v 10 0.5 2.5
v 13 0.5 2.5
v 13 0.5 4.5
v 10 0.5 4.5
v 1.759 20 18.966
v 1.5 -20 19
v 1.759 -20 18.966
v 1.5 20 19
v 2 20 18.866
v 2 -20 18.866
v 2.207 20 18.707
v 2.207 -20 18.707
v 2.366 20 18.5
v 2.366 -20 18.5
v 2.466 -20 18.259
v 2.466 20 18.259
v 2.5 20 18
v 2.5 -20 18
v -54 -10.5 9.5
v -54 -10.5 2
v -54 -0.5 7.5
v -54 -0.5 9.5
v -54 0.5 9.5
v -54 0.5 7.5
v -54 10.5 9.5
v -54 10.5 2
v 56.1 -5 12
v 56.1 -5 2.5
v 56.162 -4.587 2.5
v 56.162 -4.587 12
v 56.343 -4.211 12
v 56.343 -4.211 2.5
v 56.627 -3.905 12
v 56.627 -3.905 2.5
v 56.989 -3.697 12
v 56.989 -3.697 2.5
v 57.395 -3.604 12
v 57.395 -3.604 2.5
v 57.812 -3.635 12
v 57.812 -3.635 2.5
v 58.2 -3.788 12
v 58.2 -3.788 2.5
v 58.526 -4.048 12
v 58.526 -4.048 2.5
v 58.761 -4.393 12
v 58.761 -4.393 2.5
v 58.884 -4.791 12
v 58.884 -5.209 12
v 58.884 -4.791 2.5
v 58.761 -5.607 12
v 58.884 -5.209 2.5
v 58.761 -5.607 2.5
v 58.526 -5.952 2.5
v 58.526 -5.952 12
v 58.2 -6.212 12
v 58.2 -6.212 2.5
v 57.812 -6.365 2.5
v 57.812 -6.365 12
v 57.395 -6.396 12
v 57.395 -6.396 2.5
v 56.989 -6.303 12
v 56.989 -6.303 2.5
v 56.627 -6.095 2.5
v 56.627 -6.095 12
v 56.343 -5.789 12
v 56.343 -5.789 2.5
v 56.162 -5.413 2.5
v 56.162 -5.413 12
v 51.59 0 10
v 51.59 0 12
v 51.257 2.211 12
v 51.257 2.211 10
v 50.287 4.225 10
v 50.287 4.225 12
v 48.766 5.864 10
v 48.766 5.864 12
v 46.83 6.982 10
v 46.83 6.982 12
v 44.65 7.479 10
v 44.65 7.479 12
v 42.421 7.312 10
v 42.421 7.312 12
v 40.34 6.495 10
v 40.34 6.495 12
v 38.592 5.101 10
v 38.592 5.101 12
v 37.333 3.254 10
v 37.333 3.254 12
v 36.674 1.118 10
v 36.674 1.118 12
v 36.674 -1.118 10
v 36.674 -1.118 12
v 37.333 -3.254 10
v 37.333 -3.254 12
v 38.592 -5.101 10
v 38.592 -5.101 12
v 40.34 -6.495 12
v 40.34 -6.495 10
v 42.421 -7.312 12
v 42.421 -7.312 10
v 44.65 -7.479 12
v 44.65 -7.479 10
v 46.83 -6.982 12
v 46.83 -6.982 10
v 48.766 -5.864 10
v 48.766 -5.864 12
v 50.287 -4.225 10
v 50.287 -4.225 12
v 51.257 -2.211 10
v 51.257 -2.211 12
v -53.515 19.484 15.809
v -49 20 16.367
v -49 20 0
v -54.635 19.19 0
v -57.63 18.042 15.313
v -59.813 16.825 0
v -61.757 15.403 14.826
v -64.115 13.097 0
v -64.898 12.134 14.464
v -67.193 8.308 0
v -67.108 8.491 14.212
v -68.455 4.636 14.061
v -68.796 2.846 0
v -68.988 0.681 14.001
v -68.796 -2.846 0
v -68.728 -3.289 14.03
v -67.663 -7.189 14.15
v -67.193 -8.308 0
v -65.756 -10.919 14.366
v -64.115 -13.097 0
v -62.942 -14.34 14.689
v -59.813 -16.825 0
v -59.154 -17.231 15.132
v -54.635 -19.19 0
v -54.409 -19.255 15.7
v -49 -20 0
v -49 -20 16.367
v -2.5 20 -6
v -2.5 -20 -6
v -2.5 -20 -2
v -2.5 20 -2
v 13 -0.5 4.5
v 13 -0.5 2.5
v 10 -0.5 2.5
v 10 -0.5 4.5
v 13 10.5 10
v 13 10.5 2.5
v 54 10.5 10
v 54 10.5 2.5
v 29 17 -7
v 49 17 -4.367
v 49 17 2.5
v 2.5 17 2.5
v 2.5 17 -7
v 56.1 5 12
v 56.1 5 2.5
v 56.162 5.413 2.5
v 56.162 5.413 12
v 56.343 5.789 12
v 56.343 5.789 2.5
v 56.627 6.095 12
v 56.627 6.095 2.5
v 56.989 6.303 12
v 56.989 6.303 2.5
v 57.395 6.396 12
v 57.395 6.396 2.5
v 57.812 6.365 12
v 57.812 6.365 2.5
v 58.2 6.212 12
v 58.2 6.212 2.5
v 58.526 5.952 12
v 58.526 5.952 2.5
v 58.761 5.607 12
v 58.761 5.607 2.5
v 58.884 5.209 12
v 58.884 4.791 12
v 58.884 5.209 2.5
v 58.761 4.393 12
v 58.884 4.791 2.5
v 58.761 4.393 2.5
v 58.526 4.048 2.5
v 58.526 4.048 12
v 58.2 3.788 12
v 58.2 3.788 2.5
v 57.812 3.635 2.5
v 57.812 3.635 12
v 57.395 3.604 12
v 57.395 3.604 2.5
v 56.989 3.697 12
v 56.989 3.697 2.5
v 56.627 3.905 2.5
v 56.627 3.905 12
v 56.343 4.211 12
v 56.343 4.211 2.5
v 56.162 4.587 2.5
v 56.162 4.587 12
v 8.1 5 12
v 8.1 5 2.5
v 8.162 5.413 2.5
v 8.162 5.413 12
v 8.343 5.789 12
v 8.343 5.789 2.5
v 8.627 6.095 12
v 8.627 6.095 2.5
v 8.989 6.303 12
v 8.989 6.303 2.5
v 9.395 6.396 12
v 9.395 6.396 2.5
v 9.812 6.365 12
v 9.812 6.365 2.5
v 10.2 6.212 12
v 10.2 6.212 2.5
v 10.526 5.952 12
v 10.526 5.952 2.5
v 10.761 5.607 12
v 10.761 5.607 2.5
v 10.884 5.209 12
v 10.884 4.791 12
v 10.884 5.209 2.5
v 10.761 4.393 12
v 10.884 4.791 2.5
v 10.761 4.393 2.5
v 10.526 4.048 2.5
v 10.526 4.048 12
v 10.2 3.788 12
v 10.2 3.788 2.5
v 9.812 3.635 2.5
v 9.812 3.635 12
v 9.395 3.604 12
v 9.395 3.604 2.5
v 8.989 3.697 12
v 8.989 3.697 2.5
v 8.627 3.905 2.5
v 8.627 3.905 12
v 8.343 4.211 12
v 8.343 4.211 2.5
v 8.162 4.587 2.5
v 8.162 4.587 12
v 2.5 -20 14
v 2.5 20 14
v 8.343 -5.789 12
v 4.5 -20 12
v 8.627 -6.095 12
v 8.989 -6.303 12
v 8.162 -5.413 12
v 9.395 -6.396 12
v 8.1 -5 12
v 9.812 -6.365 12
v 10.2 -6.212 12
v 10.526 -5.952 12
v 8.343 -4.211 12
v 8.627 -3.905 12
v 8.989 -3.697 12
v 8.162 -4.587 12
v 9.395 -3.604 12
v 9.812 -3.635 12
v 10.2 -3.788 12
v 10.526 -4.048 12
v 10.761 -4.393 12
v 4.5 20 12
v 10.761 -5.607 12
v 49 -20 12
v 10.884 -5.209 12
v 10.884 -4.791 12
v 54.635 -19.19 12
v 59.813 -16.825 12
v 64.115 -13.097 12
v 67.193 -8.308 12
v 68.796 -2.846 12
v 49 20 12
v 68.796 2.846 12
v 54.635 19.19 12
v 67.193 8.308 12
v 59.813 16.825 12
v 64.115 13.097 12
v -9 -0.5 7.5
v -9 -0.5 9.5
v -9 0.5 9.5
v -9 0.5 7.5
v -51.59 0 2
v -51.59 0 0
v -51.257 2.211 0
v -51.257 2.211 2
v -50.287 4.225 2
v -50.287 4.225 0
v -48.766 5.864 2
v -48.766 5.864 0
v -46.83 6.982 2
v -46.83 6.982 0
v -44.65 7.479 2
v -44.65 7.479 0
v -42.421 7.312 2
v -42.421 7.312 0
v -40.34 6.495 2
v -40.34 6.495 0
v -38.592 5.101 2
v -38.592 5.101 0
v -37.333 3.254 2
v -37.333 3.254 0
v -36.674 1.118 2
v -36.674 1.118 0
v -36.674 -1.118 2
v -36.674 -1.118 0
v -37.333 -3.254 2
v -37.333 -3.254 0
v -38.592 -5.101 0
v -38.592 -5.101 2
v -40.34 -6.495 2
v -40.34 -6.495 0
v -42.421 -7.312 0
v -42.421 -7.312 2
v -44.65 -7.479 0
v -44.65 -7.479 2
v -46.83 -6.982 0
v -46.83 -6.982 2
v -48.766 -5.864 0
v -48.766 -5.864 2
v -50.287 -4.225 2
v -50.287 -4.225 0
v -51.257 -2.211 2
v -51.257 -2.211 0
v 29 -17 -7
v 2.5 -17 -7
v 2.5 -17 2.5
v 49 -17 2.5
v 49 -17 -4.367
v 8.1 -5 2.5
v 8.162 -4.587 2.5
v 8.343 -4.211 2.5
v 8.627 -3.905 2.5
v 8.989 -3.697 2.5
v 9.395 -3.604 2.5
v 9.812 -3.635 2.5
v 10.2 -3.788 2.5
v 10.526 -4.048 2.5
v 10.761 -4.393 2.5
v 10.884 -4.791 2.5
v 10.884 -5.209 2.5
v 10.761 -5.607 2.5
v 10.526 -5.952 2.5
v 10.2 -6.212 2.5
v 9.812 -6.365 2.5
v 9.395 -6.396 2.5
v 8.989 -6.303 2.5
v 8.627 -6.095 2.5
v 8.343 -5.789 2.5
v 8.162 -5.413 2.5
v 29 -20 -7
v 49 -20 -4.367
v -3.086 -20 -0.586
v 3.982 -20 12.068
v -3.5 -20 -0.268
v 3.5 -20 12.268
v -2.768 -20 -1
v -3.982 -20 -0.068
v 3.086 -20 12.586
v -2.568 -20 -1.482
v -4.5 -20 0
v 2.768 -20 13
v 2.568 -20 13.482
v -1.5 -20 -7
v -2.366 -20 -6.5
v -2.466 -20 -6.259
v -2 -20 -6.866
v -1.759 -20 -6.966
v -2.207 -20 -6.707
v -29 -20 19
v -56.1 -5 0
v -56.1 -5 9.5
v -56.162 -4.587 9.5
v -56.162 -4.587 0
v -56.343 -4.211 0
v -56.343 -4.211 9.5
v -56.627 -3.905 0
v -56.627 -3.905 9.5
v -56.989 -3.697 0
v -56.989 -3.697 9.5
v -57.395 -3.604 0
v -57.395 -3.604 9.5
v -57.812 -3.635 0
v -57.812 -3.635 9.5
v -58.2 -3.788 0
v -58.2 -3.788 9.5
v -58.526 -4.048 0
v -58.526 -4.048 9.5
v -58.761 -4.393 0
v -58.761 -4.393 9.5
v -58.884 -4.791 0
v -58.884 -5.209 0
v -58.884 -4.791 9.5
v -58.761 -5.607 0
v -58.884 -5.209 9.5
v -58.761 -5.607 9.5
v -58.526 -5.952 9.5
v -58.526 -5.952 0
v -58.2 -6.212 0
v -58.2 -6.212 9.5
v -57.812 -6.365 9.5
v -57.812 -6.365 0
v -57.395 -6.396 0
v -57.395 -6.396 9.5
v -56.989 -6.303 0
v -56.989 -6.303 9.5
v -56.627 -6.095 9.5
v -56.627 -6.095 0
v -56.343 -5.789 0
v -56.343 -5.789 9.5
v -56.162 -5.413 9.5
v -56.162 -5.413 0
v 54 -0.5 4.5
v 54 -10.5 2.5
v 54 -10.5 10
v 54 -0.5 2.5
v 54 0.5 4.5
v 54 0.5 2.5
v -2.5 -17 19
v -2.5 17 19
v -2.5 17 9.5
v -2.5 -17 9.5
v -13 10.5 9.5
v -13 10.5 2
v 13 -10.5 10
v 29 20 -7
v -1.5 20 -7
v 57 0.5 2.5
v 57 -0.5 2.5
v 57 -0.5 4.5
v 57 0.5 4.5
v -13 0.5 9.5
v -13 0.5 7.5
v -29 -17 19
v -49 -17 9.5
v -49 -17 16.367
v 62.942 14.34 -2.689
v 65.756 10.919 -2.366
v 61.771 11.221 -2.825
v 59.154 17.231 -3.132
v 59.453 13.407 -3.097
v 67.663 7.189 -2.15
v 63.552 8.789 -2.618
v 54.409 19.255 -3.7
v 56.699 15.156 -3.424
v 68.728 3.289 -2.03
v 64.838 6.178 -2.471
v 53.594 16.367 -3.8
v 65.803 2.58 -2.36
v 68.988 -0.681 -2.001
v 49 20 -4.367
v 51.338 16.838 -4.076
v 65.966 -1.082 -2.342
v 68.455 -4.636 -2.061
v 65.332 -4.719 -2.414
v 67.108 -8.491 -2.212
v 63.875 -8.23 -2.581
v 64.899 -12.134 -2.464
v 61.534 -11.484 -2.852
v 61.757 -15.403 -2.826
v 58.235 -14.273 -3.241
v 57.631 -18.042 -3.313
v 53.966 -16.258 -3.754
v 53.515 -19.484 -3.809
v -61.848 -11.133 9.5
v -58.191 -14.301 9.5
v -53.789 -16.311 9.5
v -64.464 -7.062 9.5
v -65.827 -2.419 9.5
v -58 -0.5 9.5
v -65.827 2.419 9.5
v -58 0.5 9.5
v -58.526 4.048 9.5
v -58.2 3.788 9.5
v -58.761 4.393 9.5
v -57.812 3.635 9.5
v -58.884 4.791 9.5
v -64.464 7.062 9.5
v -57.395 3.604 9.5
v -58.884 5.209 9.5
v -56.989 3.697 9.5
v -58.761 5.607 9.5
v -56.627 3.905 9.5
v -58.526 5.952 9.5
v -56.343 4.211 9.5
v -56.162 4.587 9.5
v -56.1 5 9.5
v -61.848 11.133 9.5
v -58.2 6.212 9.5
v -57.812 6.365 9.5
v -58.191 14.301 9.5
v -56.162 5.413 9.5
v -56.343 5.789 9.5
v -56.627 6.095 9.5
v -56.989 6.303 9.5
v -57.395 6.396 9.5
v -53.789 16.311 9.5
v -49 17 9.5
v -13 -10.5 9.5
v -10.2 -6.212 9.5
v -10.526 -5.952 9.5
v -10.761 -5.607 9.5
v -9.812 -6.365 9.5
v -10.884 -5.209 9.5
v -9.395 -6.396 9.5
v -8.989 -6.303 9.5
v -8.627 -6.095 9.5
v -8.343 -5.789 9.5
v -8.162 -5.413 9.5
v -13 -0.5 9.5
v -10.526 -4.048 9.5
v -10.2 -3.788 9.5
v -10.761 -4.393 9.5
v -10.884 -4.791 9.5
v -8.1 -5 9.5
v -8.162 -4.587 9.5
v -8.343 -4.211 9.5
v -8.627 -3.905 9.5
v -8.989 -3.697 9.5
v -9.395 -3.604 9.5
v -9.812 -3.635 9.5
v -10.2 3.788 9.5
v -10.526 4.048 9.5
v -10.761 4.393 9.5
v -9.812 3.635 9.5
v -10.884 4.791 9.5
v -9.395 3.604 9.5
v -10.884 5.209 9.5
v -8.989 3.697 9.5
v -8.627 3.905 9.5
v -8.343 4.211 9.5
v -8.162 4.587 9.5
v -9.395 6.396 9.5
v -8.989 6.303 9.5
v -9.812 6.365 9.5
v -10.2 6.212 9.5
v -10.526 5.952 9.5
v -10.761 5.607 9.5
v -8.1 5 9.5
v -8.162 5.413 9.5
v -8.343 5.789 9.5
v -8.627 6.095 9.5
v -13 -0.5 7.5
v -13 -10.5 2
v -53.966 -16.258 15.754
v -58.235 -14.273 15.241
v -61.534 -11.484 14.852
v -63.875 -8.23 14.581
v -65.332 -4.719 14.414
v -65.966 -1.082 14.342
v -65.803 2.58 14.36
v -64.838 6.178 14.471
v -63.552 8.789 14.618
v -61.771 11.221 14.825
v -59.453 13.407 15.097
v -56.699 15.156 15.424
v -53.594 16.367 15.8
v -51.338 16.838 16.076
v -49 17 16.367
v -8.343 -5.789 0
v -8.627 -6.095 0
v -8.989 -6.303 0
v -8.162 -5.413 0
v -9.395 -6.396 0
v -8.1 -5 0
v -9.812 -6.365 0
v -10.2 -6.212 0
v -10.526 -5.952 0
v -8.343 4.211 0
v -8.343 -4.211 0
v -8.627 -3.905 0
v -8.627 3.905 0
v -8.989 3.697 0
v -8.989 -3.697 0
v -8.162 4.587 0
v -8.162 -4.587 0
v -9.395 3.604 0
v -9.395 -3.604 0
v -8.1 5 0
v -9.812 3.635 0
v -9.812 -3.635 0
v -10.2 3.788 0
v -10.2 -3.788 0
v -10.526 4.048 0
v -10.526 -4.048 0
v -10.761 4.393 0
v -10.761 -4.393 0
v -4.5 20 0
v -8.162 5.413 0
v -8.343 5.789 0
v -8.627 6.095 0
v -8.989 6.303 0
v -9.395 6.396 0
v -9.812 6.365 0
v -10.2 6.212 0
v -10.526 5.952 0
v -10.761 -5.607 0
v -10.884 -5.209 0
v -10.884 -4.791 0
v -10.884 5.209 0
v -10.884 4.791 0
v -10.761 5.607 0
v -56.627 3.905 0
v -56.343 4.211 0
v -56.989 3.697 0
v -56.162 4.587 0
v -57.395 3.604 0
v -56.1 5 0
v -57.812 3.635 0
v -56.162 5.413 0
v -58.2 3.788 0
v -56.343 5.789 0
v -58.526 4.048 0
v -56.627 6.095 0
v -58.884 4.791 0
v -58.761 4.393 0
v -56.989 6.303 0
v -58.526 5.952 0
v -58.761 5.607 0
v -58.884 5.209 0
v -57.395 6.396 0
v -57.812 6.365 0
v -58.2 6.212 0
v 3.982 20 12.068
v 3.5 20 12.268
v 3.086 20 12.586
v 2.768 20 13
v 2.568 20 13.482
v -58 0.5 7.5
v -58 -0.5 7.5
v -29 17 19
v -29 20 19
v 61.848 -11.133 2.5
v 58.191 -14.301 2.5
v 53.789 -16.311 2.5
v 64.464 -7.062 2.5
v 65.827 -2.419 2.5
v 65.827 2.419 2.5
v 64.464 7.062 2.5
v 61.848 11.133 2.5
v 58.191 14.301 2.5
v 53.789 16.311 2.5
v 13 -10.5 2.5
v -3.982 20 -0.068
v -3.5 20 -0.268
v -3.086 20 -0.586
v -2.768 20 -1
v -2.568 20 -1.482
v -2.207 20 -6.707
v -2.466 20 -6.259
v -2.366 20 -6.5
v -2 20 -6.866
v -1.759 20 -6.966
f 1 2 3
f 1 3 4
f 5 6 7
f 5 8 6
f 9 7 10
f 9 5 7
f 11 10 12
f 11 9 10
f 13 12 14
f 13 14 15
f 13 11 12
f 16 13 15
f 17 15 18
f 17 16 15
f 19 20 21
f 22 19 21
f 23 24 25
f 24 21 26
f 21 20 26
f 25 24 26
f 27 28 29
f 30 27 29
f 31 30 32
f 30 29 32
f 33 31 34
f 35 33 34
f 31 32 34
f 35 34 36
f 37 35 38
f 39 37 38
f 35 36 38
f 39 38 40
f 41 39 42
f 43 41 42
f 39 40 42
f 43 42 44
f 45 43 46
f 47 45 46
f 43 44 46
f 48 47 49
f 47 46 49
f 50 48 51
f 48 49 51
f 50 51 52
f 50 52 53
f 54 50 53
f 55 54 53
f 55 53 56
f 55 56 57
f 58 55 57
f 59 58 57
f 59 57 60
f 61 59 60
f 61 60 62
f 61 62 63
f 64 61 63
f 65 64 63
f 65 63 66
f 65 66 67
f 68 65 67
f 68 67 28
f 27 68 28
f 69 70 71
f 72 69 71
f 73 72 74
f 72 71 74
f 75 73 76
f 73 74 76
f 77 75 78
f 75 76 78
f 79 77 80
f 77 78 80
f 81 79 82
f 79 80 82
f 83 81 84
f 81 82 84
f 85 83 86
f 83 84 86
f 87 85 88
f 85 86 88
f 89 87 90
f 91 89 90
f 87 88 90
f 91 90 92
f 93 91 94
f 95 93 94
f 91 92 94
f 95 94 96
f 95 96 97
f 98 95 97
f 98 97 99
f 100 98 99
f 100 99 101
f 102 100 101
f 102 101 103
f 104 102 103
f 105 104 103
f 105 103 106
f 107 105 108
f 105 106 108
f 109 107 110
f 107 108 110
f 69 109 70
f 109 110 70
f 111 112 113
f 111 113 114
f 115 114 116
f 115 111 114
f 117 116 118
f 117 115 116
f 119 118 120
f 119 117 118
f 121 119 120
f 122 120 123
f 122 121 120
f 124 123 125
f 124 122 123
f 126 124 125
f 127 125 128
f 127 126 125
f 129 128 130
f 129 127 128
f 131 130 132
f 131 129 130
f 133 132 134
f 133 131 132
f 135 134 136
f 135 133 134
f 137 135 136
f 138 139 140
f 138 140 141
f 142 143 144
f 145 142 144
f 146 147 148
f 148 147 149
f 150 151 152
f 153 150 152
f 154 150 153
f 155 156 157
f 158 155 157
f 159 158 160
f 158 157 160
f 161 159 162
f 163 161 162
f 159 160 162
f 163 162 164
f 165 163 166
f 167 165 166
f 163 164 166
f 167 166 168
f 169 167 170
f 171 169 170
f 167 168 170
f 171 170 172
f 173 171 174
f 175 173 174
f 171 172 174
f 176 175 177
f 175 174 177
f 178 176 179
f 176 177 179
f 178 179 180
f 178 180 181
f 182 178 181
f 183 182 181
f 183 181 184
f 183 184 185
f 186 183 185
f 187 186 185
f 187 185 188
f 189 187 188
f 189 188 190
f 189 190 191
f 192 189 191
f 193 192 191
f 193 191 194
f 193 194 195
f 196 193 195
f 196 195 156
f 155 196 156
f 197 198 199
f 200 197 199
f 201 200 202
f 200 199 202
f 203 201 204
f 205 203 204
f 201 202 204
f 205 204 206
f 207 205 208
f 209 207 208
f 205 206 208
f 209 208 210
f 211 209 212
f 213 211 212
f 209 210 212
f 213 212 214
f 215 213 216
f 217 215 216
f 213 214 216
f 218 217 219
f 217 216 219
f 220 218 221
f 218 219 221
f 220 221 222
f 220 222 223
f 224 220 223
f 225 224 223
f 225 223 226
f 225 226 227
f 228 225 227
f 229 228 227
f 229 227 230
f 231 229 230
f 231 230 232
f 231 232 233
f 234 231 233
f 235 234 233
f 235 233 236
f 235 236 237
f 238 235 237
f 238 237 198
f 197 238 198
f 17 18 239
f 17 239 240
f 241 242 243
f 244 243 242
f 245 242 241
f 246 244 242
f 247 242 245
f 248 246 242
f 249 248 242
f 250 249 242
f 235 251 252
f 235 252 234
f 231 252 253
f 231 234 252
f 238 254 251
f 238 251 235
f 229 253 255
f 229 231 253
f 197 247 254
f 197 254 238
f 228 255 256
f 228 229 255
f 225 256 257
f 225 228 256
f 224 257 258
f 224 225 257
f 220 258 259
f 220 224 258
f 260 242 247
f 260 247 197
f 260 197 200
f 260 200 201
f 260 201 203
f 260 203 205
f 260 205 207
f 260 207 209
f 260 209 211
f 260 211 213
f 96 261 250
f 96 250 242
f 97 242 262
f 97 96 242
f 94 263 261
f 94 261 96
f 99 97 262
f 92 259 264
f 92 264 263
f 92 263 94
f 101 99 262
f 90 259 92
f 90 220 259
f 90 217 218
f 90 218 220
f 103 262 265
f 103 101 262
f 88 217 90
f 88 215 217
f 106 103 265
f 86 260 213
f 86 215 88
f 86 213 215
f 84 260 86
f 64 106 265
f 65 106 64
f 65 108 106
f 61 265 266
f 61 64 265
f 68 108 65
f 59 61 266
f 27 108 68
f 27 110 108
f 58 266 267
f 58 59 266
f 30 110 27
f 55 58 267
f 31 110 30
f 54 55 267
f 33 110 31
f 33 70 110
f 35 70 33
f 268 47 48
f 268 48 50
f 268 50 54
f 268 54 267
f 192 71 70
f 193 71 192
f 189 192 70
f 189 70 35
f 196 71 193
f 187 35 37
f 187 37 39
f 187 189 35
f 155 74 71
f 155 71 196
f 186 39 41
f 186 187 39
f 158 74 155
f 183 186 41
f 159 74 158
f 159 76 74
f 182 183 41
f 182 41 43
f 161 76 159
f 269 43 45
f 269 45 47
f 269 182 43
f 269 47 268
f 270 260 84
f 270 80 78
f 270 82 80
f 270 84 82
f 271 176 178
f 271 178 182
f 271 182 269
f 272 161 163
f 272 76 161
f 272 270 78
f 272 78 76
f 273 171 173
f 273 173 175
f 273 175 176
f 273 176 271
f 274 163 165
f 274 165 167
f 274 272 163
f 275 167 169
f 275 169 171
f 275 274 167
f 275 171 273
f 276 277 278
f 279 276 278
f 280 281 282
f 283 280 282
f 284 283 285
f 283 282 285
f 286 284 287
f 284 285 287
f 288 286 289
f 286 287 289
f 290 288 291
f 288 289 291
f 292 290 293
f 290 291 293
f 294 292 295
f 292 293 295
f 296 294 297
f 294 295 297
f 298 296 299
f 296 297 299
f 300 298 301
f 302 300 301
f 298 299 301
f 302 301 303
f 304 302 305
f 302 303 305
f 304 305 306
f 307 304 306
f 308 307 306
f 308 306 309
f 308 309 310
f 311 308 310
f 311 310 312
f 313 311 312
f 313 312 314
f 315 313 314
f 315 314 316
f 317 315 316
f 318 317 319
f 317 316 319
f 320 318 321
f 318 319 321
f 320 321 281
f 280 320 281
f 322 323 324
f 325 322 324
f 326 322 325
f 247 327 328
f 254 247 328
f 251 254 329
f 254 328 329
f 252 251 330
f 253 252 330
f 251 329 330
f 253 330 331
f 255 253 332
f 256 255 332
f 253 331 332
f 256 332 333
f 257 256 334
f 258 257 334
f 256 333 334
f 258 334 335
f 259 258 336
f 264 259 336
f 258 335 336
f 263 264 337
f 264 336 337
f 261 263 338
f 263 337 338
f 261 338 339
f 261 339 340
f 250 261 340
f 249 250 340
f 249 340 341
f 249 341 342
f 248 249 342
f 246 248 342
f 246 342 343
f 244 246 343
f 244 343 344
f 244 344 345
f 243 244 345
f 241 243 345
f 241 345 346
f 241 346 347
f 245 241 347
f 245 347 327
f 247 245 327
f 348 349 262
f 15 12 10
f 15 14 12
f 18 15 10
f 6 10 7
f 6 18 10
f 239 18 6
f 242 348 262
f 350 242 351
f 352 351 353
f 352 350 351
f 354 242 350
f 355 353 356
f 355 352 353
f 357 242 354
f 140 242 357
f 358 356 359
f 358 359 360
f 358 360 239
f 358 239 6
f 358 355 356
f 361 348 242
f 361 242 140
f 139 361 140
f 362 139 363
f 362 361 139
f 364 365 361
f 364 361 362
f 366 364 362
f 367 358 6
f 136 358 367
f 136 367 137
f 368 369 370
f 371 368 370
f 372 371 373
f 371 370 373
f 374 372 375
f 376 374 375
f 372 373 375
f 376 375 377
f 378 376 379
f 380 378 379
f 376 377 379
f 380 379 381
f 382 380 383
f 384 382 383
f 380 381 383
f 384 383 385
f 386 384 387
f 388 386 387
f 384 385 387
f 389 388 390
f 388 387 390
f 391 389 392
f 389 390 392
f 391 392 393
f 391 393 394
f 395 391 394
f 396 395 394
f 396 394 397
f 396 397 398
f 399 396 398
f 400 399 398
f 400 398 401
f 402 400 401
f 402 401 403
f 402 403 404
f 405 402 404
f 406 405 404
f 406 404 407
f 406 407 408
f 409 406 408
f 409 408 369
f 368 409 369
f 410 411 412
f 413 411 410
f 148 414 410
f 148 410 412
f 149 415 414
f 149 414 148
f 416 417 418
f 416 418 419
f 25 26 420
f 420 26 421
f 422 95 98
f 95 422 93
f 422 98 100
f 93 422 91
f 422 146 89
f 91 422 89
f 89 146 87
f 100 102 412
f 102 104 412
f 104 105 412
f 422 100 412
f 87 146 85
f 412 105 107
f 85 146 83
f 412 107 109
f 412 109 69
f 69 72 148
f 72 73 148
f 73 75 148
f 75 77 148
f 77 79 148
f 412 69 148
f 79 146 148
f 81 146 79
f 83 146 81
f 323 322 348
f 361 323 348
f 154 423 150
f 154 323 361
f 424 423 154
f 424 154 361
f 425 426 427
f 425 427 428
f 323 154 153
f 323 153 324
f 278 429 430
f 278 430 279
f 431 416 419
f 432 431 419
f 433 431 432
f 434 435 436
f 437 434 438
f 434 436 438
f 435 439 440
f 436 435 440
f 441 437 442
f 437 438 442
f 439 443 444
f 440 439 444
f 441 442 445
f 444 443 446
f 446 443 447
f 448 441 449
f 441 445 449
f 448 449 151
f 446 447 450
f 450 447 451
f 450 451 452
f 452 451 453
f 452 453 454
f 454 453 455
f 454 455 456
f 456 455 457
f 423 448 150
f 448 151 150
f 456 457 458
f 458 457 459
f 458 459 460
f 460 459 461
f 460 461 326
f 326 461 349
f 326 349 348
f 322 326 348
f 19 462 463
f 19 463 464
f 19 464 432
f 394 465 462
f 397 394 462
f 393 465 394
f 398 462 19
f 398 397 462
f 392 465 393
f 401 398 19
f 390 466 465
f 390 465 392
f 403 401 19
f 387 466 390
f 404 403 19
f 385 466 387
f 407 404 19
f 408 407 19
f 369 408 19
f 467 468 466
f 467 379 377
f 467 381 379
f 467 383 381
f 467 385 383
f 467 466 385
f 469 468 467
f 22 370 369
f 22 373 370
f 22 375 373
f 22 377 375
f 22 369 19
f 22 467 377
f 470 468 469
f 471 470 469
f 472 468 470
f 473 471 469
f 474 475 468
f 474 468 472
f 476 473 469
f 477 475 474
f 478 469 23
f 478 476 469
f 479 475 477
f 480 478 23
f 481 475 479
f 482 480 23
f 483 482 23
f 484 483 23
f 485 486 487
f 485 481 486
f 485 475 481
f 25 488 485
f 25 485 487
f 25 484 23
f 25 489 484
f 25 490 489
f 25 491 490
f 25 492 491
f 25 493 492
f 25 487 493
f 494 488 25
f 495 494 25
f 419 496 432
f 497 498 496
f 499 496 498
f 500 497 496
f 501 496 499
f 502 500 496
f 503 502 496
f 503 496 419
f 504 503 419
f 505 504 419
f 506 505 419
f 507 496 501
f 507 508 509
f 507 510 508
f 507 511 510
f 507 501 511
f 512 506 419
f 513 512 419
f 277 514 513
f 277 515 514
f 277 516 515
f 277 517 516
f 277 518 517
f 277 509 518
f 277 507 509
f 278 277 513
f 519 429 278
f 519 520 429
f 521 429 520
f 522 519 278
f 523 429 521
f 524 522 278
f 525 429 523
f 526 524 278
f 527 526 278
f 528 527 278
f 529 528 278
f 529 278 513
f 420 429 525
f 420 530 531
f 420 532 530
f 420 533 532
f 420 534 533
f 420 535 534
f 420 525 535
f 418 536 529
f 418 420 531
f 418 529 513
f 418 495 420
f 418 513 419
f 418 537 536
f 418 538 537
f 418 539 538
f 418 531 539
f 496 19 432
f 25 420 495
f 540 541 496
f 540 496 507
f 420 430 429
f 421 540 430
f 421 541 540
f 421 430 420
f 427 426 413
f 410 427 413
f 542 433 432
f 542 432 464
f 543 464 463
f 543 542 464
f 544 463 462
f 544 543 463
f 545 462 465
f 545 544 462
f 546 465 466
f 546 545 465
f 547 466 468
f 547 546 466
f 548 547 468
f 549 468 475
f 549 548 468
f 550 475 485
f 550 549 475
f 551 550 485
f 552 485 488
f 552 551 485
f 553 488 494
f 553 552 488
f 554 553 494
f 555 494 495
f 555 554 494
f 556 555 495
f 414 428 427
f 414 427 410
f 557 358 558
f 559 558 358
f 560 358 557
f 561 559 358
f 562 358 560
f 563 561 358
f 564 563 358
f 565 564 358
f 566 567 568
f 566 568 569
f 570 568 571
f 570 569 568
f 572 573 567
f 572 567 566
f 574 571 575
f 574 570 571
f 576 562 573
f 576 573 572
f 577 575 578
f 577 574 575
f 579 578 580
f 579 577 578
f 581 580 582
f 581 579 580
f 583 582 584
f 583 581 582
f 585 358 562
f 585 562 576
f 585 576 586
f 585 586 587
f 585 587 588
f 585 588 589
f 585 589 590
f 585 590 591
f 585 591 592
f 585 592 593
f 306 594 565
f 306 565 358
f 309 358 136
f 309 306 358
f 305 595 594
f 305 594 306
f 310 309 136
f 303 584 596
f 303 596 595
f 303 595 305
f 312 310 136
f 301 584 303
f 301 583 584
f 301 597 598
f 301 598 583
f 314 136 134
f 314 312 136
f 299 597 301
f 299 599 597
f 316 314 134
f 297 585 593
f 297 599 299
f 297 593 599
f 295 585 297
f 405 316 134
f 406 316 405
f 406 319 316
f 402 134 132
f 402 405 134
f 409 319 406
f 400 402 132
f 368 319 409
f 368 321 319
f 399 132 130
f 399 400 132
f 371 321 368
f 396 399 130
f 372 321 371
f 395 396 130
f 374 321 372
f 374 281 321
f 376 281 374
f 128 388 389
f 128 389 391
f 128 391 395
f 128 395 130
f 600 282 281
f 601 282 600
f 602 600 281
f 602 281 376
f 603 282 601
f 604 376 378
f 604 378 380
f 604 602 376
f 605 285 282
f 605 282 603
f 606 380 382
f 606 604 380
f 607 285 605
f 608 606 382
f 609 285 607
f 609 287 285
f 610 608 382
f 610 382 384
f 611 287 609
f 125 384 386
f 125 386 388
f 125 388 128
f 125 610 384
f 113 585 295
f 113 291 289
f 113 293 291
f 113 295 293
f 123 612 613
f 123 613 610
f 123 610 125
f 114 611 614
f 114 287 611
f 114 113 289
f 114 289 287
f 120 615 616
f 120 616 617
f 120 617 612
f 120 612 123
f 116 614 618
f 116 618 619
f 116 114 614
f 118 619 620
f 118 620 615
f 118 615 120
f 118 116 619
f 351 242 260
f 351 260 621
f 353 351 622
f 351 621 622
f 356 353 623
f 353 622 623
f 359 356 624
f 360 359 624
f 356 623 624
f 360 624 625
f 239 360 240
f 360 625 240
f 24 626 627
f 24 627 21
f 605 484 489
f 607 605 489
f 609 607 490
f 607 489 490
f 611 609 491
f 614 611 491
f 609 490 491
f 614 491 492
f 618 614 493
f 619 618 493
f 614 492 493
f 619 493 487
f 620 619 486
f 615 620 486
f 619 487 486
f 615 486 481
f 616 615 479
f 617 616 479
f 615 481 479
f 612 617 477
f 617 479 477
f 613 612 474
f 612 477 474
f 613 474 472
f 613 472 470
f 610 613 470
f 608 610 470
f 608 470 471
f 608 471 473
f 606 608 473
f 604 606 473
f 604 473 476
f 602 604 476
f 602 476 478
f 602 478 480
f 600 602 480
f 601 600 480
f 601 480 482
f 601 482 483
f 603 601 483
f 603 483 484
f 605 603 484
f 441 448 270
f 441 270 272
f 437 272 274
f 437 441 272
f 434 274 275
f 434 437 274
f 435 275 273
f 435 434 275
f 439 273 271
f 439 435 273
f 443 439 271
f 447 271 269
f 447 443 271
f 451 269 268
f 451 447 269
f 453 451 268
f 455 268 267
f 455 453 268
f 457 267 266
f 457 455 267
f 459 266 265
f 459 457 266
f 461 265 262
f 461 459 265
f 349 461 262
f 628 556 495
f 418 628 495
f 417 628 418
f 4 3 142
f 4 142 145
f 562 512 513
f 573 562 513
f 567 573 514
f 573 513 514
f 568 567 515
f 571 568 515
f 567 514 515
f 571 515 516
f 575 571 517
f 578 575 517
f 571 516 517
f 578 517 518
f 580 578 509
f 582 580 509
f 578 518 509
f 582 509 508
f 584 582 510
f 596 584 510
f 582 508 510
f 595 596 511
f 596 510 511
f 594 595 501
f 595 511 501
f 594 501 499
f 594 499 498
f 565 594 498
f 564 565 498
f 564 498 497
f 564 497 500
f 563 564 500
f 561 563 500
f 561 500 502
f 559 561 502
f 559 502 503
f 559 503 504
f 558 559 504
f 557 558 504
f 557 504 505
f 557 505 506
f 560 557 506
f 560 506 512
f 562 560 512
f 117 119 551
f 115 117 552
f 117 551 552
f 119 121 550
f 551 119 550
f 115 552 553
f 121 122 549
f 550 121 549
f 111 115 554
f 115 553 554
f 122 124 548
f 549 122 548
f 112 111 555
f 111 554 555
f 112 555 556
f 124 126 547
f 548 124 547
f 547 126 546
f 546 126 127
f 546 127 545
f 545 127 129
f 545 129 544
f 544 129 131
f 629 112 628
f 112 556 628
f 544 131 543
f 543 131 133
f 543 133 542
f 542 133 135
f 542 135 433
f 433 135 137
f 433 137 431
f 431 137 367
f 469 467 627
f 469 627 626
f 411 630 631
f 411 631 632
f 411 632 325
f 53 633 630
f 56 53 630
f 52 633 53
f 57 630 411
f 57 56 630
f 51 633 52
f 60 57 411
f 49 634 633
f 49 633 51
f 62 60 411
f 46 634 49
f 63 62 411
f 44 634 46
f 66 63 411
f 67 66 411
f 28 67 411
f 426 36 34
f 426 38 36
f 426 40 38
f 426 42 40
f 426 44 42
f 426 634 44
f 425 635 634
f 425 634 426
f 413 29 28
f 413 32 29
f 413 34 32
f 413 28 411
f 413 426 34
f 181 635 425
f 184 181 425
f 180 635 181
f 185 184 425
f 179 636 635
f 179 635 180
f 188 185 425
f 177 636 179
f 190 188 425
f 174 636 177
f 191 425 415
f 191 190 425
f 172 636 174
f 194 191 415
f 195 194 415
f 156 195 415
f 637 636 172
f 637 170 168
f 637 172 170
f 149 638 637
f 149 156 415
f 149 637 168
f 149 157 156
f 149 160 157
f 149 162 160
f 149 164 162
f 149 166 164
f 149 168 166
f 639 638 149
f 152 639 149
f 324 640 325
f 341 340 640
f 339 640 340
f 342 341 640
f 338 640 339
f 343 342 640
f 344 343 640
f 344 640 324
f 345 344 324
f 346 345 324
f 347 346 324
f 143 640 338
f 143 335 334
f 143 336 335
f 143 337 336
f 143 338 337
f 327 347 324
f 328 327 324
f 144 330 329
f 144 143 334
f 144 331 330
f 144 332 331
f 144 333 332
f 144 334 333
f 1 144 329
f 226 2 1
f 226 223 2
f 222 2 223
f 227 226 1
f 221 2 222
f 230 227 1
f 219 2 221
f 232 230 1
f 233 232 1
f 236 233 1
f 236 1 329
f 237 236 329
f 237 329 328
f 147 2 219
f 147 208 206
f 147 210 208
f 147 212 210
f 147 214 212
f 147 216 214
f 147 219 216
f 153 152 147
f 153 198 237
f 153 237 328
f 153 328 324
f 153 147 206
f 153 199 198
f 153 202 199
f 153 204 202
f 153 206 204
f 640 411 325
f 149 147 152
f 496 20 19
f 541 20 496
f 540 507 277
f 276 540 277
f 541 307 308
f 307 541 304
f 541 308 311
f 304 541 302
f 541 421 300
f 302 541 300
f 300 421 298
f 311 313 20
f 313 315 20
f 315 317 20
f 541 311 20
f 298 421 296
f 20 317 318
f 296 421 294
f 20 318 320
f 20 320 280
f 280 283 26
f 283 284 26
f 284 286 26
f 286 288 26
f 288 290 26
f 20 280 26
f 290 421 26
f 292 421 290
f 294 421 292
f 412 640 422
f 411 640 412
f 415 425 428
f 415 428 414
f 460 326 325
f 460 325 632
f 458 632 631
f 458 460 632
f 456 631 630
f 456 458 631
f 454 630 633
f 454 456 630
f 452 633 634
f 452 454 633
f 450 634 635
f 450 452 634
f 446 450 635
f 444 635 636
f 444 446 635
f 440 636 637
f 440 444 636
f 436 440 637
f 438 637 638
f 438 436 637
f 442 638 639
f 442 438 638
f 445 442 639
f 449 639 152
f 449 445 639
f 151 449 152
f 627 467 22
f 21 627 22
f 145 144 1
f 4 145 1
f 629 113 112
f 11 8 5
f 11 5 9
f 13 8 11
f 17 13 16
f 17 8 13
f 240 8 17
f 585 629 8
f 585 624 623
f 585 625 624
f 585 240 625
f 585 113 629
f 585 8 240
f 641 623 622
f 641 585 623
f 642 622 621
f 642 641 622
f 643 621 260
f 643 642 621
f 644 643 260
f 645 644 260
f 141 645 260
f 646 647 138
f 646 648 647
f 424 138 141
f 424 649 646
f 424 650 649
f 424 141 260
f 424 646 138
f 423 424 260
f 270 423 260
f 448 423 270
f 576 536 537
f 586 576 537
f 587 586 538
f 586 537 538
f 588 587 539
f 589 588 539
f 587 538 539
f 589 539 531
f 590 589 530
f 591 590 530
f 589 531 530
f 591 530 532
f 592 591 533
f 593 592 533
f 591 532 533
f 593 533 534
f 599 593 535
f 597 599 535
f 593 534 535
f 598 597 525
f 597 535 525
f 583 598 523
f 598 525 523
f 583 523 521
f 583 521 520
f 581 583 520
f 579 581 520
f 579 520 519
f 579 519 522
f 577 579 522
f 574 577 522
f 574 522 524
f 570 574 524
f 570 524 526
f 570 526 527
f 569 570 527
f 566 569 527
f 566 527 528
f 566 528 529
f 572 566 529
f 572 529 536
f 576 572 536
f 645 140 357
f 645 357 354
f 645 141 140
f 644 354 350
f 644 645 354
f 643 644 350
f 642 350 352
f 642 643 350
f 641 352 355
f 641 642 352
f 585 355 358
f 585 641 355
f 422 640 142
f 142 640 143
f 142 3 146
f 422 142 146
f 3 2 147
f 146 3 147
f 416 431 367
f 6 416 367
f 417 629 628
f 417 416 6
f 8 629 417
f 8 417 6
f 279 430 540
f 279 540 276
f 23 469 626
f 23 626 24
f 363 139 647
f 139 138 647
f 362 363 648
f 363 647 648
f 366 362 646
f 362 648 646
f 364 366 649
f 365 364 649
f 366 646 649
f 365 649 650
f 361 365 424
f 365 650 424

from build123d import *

# Parameters (mm, degrees)
SKETCH1_W               = 138
SKETCH1_H               = 40
SKETCH1_W_2             = 41
SKETCH1_H_2             = 21
BOSS_EXTRUDE1_DEPTH     = 12
FILLET1_RADIUS          = 20
FILLET1_LENGTH          = 12
FILLET2_RADIUS          = 20
FILLET2_LENGTH          = 12
BOSS_EXTRUDE3_START     = 7
BOSS_EXTRUDE3_DEPTH     = 7
BOSS_EXTRUDE4_START     = 7
BOSS_EXTRUDE4_DEPTH     = 7
CUT_EXTRUDE1_DEPTH      = 75.310160813
CUT_EXTRUDE1_DEPTH_BACK = 75.310160813
CUT_EXTRUDE2_DEPTH      = 2.5
SKETCH9_W               = 41
SKETCH9_H               = 21
CUT_EXTRUDE3_DEPTH      = 2.5
SKETCH10_W              = 41
SKETCH10_H              = 21
SKETCH10_R              = 7.5
BOSS_EXTRUDE5_DEPTH     = 2
SKETCH11_W              = 41
SKETCH11_H              = 21
SKETCH11_R              = 7.5
BOSS_EXTRUDE6_DEPTH     = 2
SKETCH12_W              = 4
SKETCH12_H              = 1
CUT_EXTRUDE4_DEPTH      = 2
SKETCH13_W              = 3
SKETCH13_H              = 1
CUT_EXTRUDE5_DEPTH      = 2
FILLET4_R               = 2
FILLET5_R               = 2
FILLET6_R               = 1
SKETCH14_R              = 1.4
CUT_EXTRUDE6_DEPTH      = 74.71058283
SKETCH15_R              = 1.4
CUT_EXTRUDE7_DEPTH      = 74.71058283


with BuildPart() as part:
    # Sketch1 → Boss-Extrude1 (new body)
    with BuildSketch(Plane.XY):
        Rectangle(SKETCH1_W, SKETCH1_H)
        with Locations((-33.5, 0)):
            Rectangle(SKETCH1_W_2, SKETCH1_H_2, mode=Mode.SUBTRACT)
        with Locations((33.5, 0)):
            Rectangle(SKETCH1_W_2, SKETCH1_H_2, mode=Mode.SUBTRACT)
    extrude(amount=BOSS_EXTRUDE1_DEPTH)

    # Fillet1: full round fillet: the end face becomes a half cylinder, R = half its width
    fillet1_face = Plane((-69, 0, 6), x_dir=(0, 0, 1), z_dir=(-1, 0, 0))  # on the end face: x along it, z out of the body
    fillet1_slab = fillet1_face.offset(-FILLET1_RADIUS / 2) * Box(FILLET1_LENGTH, 2 * FILLET1_RADIUS, FILLET1_RADIUS, mode=Mode.PRIVATE)  # the body's end, R deep
    fillet1_round = Plane((-49, 0, 6), x_dir=(-1, 0, 0), z_dir=(0, 0, 1)) * Cylinder(FILLET1_RADIUS, FILLET1_LENGTH, mode=Mode.PRIVATE)  # its axis R under the face
    add(fillet1_slab - fillet1_round, mode=Mode.SUBTRACT)

    # Fillet2: full round fillet: the end face becomes a half cylinder, R = half its width
    fillet2_face = Plane((69, 0, 6), x_dir=(0, 0, -1), z_dir=(1, 0, 0))  # on the end face: x along it, z out of the body
    fillet2_slab = fillet2_face.offset(-FILLET2_RADIUS / 2) * Box(FILLET2_LENGTH, 2 * FILLET2_RADIUS, FILLET2_RADIUS, mode=Mode.PRIVATE)  # the body's end, R deep
    fillet2_round = Plane((49, 0, 6), x_dir=(1, 0, 0), z_dir=(0, 0, -1)) * Cylinder(FILLET2_RADIUS, FILLET2_LENGTH, mode=Mode.PRIVATE)  # its axis R under the face
    add(fillet2_slab - fillet2_round, mode=Mode.SUBTRACT)

    # Sketch3 → Boss-Extrude3 (add)
    with BuildSketch(Plane.XY.offset(12).offset(BOSS_EXTRUDE3_START)):
        with BuildLine():
            Line((-49, -20), (-2.5, -20))
            Line((-2.5, -20), (2.5, -20))
            Line((2.5, -20), (2.5, 20))
            Line((2.5, 20), (-2.5, 20))
            Line((-2.5, 20), (-49, 20))
            ThreePointArc((-49, 20), (-69, 0), (-49, -20))
        make_face()
        with BuildLine():
            Line((-2.5, 17), (-2.5, -17))
            Line((-2.5, -17), (-49, -17))
            ThreePointArc((-49, -17), (-66, 0), (-49, 17))
            Line((-49, 17), (-2.5, 17))
        make_face(mode=Mode.SUBTRACT)
    extrude(amount=-BOSS_EXTRUDE3_DEPTH)

    # Sketch5 → Boss-Extrude4 (add)
    with BuildSketch(Plane(origin=(0, 0, 0), x_dir=(-1, 0, 0), z_dir=(0, 0, -1)).offset(BOSS_EXTRUDE4_START)):
        with BuildLine():
            Line((-49, -20), (-2.5, -20))
            Line((-2.5, -20), (2.5, -20))
            Line((2.5, -20), (2.5, 20))
            Line((2.5, 20), (-2.5, 20))
            Line((-2.5, 20), (-49, 20))
            ThreePointArc((-49, 20), (-69, 0), (-49, -20))
        make_face()
        with BuildLine():
            Line((-2.5, 17), (-2.5, -17))
            Line((-2.5, -17), (-49, -17))
            ThreePointArc((-49, -17), (-66, 0), (-49, 17))
            Line((-49, 17), (-2.5, 17))
        make_face(mode=Mode.SUBTRACT)
    extrude(amount=-BOSS_EXTRUDE4_DEPTH)

    # Sketch6 → Cut-Extrude1 (cut, two sides: drawn at the far end of the back side and taken through both)
    with BuildSketch(Plane(origin=(0, 0, 0), x_dir=(1, 0, 0), z_dir=(0, 1, 0)).offset(-CUT_EXTRUDE1_DEPTH_BACK)):
        with BuildLine():
            Line((-69, -19), (-29, -19))
            add(Edge.make_bspline(
                [(-69, -14), (-48.966763925, -16.237598457), (-29, -19)],
                knots=[0, 0, 0, 1, 1, 1], degree=2))
            Line((-69, -14), (-69, -19))
        make_face()
        with BuildLine():
            Line((69, 7), (29, 7))
            add(Edge.make_bspline(
                [(69, 2), (48.966763925, 4.237598457), (29, 7)],
                knots=[0, 0, 0, 1, 1, 1], degree=2))
            Line((69, 2), (69, 7))
        make_face()
    extrude(amount=CUT_EXTRUDE1_DEPTH + CUT_EXTRUDE1_DEPTH_BACK, mode=Mode.SUBTRACT)

    # Sketch8 → Cut-Extrude2 (cut)
    with BuildSketch(Plane.XY.offset(12)):
        with BuildLine():
            Line((-49, -17), (-2.5, -17))
            Line((-2.5, -17), (-2.5, 17))
            Line((-2.5, 17), (-29, 17))
            Line((-29, 17), (-49, 17))
            ThreePointArc((-49, 17), (-66, 0), (-49, -17))
        make_face()
    extrude(amount=-CUT_EXTRUDE2_DEPTH, mode=Mode.SUBTRACT)

    # Sketch9 → Cut-Extrude3 (cut)
    with BuildSketch(Plane(origin=(0, 0, 0), x_dir=(-1, 0, 0), z_dir=(0, 0, -1))):
        with BuildLine():
            ThreePointArc((-49, 17), (-66, 0), (-49, -17))
            Line((-49, -17), (-2.5, -17))
            Line((-2.5, -17), (-2.5, 17))
            Line((-2.5, 17), (-29, 17))
            Line((-29, 17), (-49, 17))
        make_face()
        with Locations((-33.5, 0)):
            Rectangle(SKETCH9_W, SKETCH9_H, mode=Mode.SUBTRACT)
    extrude(amount=-CUT_EXTRUDE3_DEPTH, mode=Mode.SUBTRACT)

    # Sketch10 → Boss-Extrude5 (add)
    with BuildSketch(Plane.XY.offset(12)):
        with Locations((33.5, 0)):
            Rectangle(SKETCH10_W, SKETCH10_H)
        with Locations((44.09, 0)):
            Circle(SKETCH10_R, mode=Mode.SUBTRACT)
    extrude(amount=-BOSS_EXTRUDE5_DEPTH)

    # Sketch11 → Boss-Extrude6 (add)
    with BuildSketch(Plane(origin=(0, 0, 0), x_dir=(-1, 0, 0), z_dir=(0, 0, -1))):
        with Locations((33.5, 0)):
            Rectangle(SKETCH11_W, SKETCH11_H)
        with Locations((44.09, 0)):
            Circle(SKETCH11_R, mode=Mode.SUBTRACT)
    extrude(amount=-BOSS_EXTRUDE6_DEPTH)

    # Sketch12 → Cut-Extrude4 (cut)
    with BuildSketch(Plane.XY.offset(9.5)):
        with Locations((-56, 0)):
            Rectangle(SKETCH12_W, SKETCH12_H)
        with Locations((-11, 0)):
            Rectangle(SKETCH12_W, SKETCH12_H)
    extrude(amount=-CUT_EXTRUDE4_DEPTH, mode=Mode.SUBTRACT)

    # Sketch13 → Cut-Extrude5 (cut)
    with BuildSketch(Plane(origin=(0, 0, 2.5), x_dir=(-1, 0, 0), z_dir=(0, 0, -1))):
        with Locations((-55.5, 0)):
            Rectangle(SKETCH13_W, SKETCH13_H)
        with Locations((-11.5, 0)):
            Rectangle(SKETCH13_W, SKETCH13_H)
    extrude(amount=-CUT_EXTRUDE5_DEPTH, mode=Mode.SUBTRACT)

    # Fillet4
    fillet4_edges = [part.edges().sort_by_distance(p)[0] for p in [
        (2.5, 0, 12),
    ]]
    fillet(fillet4_edges, radius=FILLET4_R)

    # Fillet5
    fillet5_edges = [part.edges().sort_by_distance(p)[0] for p in [
        (-2.5, 0, 0),
    ]]
    fillet(fillet5_edges, radius=FILLET5_R)

    # Fillet6
    fillet6_edges = [part.edges().sort_by_distance(p)[0] for p in [
        (2.5, 0, 19),
        (-2.5, 0, -7),
    ]]
    fillet(fillet6_edges, radius=FILLET6_R)

    # Sketch14 → Cut-Extrude6 (cut, through all)
    with BuildSketch(Plane(origin=(0, 0, 2.5), x_dir=(-1, 0, 0), z_dir=(0, 0, -1))):
        with Locations((-57.5, 5)):
            Circle(SKETCH14_R)
        with Locations((-57.5, -5)):
            Circle(SKETCH14_R)
        with Locations((-9.5, 5)):
            Circle(SKETCH14_R)
        with Locations((-9.5, -5)):
            Circle(SKETCH14_R)
    extrude(amount=-CUT_EXTRUDE6_DEPTH, mode=Mode.SUBTRACT)

    # Sketch15 → Cut-Extrude7 (cut, through all)
    with BuildSketch(Plane.XY.offset(9.5)):
        with Locations((-57.5, 5)):
            Circle(SKETCH15_R)
        with Locations((-57.5, -5)):
            Circle(SKETCH15_R)
        with Locations((-9.5, -5)):
            Circle(SKETCH15_R)
        with Locations((-9.5, 5)):
            Circle(SKETCH15_R)
    extrude(amount=-CUT_EXTRUDE7_DEPTH, mode=Mode.SUBTRACT)


solid = part.part
